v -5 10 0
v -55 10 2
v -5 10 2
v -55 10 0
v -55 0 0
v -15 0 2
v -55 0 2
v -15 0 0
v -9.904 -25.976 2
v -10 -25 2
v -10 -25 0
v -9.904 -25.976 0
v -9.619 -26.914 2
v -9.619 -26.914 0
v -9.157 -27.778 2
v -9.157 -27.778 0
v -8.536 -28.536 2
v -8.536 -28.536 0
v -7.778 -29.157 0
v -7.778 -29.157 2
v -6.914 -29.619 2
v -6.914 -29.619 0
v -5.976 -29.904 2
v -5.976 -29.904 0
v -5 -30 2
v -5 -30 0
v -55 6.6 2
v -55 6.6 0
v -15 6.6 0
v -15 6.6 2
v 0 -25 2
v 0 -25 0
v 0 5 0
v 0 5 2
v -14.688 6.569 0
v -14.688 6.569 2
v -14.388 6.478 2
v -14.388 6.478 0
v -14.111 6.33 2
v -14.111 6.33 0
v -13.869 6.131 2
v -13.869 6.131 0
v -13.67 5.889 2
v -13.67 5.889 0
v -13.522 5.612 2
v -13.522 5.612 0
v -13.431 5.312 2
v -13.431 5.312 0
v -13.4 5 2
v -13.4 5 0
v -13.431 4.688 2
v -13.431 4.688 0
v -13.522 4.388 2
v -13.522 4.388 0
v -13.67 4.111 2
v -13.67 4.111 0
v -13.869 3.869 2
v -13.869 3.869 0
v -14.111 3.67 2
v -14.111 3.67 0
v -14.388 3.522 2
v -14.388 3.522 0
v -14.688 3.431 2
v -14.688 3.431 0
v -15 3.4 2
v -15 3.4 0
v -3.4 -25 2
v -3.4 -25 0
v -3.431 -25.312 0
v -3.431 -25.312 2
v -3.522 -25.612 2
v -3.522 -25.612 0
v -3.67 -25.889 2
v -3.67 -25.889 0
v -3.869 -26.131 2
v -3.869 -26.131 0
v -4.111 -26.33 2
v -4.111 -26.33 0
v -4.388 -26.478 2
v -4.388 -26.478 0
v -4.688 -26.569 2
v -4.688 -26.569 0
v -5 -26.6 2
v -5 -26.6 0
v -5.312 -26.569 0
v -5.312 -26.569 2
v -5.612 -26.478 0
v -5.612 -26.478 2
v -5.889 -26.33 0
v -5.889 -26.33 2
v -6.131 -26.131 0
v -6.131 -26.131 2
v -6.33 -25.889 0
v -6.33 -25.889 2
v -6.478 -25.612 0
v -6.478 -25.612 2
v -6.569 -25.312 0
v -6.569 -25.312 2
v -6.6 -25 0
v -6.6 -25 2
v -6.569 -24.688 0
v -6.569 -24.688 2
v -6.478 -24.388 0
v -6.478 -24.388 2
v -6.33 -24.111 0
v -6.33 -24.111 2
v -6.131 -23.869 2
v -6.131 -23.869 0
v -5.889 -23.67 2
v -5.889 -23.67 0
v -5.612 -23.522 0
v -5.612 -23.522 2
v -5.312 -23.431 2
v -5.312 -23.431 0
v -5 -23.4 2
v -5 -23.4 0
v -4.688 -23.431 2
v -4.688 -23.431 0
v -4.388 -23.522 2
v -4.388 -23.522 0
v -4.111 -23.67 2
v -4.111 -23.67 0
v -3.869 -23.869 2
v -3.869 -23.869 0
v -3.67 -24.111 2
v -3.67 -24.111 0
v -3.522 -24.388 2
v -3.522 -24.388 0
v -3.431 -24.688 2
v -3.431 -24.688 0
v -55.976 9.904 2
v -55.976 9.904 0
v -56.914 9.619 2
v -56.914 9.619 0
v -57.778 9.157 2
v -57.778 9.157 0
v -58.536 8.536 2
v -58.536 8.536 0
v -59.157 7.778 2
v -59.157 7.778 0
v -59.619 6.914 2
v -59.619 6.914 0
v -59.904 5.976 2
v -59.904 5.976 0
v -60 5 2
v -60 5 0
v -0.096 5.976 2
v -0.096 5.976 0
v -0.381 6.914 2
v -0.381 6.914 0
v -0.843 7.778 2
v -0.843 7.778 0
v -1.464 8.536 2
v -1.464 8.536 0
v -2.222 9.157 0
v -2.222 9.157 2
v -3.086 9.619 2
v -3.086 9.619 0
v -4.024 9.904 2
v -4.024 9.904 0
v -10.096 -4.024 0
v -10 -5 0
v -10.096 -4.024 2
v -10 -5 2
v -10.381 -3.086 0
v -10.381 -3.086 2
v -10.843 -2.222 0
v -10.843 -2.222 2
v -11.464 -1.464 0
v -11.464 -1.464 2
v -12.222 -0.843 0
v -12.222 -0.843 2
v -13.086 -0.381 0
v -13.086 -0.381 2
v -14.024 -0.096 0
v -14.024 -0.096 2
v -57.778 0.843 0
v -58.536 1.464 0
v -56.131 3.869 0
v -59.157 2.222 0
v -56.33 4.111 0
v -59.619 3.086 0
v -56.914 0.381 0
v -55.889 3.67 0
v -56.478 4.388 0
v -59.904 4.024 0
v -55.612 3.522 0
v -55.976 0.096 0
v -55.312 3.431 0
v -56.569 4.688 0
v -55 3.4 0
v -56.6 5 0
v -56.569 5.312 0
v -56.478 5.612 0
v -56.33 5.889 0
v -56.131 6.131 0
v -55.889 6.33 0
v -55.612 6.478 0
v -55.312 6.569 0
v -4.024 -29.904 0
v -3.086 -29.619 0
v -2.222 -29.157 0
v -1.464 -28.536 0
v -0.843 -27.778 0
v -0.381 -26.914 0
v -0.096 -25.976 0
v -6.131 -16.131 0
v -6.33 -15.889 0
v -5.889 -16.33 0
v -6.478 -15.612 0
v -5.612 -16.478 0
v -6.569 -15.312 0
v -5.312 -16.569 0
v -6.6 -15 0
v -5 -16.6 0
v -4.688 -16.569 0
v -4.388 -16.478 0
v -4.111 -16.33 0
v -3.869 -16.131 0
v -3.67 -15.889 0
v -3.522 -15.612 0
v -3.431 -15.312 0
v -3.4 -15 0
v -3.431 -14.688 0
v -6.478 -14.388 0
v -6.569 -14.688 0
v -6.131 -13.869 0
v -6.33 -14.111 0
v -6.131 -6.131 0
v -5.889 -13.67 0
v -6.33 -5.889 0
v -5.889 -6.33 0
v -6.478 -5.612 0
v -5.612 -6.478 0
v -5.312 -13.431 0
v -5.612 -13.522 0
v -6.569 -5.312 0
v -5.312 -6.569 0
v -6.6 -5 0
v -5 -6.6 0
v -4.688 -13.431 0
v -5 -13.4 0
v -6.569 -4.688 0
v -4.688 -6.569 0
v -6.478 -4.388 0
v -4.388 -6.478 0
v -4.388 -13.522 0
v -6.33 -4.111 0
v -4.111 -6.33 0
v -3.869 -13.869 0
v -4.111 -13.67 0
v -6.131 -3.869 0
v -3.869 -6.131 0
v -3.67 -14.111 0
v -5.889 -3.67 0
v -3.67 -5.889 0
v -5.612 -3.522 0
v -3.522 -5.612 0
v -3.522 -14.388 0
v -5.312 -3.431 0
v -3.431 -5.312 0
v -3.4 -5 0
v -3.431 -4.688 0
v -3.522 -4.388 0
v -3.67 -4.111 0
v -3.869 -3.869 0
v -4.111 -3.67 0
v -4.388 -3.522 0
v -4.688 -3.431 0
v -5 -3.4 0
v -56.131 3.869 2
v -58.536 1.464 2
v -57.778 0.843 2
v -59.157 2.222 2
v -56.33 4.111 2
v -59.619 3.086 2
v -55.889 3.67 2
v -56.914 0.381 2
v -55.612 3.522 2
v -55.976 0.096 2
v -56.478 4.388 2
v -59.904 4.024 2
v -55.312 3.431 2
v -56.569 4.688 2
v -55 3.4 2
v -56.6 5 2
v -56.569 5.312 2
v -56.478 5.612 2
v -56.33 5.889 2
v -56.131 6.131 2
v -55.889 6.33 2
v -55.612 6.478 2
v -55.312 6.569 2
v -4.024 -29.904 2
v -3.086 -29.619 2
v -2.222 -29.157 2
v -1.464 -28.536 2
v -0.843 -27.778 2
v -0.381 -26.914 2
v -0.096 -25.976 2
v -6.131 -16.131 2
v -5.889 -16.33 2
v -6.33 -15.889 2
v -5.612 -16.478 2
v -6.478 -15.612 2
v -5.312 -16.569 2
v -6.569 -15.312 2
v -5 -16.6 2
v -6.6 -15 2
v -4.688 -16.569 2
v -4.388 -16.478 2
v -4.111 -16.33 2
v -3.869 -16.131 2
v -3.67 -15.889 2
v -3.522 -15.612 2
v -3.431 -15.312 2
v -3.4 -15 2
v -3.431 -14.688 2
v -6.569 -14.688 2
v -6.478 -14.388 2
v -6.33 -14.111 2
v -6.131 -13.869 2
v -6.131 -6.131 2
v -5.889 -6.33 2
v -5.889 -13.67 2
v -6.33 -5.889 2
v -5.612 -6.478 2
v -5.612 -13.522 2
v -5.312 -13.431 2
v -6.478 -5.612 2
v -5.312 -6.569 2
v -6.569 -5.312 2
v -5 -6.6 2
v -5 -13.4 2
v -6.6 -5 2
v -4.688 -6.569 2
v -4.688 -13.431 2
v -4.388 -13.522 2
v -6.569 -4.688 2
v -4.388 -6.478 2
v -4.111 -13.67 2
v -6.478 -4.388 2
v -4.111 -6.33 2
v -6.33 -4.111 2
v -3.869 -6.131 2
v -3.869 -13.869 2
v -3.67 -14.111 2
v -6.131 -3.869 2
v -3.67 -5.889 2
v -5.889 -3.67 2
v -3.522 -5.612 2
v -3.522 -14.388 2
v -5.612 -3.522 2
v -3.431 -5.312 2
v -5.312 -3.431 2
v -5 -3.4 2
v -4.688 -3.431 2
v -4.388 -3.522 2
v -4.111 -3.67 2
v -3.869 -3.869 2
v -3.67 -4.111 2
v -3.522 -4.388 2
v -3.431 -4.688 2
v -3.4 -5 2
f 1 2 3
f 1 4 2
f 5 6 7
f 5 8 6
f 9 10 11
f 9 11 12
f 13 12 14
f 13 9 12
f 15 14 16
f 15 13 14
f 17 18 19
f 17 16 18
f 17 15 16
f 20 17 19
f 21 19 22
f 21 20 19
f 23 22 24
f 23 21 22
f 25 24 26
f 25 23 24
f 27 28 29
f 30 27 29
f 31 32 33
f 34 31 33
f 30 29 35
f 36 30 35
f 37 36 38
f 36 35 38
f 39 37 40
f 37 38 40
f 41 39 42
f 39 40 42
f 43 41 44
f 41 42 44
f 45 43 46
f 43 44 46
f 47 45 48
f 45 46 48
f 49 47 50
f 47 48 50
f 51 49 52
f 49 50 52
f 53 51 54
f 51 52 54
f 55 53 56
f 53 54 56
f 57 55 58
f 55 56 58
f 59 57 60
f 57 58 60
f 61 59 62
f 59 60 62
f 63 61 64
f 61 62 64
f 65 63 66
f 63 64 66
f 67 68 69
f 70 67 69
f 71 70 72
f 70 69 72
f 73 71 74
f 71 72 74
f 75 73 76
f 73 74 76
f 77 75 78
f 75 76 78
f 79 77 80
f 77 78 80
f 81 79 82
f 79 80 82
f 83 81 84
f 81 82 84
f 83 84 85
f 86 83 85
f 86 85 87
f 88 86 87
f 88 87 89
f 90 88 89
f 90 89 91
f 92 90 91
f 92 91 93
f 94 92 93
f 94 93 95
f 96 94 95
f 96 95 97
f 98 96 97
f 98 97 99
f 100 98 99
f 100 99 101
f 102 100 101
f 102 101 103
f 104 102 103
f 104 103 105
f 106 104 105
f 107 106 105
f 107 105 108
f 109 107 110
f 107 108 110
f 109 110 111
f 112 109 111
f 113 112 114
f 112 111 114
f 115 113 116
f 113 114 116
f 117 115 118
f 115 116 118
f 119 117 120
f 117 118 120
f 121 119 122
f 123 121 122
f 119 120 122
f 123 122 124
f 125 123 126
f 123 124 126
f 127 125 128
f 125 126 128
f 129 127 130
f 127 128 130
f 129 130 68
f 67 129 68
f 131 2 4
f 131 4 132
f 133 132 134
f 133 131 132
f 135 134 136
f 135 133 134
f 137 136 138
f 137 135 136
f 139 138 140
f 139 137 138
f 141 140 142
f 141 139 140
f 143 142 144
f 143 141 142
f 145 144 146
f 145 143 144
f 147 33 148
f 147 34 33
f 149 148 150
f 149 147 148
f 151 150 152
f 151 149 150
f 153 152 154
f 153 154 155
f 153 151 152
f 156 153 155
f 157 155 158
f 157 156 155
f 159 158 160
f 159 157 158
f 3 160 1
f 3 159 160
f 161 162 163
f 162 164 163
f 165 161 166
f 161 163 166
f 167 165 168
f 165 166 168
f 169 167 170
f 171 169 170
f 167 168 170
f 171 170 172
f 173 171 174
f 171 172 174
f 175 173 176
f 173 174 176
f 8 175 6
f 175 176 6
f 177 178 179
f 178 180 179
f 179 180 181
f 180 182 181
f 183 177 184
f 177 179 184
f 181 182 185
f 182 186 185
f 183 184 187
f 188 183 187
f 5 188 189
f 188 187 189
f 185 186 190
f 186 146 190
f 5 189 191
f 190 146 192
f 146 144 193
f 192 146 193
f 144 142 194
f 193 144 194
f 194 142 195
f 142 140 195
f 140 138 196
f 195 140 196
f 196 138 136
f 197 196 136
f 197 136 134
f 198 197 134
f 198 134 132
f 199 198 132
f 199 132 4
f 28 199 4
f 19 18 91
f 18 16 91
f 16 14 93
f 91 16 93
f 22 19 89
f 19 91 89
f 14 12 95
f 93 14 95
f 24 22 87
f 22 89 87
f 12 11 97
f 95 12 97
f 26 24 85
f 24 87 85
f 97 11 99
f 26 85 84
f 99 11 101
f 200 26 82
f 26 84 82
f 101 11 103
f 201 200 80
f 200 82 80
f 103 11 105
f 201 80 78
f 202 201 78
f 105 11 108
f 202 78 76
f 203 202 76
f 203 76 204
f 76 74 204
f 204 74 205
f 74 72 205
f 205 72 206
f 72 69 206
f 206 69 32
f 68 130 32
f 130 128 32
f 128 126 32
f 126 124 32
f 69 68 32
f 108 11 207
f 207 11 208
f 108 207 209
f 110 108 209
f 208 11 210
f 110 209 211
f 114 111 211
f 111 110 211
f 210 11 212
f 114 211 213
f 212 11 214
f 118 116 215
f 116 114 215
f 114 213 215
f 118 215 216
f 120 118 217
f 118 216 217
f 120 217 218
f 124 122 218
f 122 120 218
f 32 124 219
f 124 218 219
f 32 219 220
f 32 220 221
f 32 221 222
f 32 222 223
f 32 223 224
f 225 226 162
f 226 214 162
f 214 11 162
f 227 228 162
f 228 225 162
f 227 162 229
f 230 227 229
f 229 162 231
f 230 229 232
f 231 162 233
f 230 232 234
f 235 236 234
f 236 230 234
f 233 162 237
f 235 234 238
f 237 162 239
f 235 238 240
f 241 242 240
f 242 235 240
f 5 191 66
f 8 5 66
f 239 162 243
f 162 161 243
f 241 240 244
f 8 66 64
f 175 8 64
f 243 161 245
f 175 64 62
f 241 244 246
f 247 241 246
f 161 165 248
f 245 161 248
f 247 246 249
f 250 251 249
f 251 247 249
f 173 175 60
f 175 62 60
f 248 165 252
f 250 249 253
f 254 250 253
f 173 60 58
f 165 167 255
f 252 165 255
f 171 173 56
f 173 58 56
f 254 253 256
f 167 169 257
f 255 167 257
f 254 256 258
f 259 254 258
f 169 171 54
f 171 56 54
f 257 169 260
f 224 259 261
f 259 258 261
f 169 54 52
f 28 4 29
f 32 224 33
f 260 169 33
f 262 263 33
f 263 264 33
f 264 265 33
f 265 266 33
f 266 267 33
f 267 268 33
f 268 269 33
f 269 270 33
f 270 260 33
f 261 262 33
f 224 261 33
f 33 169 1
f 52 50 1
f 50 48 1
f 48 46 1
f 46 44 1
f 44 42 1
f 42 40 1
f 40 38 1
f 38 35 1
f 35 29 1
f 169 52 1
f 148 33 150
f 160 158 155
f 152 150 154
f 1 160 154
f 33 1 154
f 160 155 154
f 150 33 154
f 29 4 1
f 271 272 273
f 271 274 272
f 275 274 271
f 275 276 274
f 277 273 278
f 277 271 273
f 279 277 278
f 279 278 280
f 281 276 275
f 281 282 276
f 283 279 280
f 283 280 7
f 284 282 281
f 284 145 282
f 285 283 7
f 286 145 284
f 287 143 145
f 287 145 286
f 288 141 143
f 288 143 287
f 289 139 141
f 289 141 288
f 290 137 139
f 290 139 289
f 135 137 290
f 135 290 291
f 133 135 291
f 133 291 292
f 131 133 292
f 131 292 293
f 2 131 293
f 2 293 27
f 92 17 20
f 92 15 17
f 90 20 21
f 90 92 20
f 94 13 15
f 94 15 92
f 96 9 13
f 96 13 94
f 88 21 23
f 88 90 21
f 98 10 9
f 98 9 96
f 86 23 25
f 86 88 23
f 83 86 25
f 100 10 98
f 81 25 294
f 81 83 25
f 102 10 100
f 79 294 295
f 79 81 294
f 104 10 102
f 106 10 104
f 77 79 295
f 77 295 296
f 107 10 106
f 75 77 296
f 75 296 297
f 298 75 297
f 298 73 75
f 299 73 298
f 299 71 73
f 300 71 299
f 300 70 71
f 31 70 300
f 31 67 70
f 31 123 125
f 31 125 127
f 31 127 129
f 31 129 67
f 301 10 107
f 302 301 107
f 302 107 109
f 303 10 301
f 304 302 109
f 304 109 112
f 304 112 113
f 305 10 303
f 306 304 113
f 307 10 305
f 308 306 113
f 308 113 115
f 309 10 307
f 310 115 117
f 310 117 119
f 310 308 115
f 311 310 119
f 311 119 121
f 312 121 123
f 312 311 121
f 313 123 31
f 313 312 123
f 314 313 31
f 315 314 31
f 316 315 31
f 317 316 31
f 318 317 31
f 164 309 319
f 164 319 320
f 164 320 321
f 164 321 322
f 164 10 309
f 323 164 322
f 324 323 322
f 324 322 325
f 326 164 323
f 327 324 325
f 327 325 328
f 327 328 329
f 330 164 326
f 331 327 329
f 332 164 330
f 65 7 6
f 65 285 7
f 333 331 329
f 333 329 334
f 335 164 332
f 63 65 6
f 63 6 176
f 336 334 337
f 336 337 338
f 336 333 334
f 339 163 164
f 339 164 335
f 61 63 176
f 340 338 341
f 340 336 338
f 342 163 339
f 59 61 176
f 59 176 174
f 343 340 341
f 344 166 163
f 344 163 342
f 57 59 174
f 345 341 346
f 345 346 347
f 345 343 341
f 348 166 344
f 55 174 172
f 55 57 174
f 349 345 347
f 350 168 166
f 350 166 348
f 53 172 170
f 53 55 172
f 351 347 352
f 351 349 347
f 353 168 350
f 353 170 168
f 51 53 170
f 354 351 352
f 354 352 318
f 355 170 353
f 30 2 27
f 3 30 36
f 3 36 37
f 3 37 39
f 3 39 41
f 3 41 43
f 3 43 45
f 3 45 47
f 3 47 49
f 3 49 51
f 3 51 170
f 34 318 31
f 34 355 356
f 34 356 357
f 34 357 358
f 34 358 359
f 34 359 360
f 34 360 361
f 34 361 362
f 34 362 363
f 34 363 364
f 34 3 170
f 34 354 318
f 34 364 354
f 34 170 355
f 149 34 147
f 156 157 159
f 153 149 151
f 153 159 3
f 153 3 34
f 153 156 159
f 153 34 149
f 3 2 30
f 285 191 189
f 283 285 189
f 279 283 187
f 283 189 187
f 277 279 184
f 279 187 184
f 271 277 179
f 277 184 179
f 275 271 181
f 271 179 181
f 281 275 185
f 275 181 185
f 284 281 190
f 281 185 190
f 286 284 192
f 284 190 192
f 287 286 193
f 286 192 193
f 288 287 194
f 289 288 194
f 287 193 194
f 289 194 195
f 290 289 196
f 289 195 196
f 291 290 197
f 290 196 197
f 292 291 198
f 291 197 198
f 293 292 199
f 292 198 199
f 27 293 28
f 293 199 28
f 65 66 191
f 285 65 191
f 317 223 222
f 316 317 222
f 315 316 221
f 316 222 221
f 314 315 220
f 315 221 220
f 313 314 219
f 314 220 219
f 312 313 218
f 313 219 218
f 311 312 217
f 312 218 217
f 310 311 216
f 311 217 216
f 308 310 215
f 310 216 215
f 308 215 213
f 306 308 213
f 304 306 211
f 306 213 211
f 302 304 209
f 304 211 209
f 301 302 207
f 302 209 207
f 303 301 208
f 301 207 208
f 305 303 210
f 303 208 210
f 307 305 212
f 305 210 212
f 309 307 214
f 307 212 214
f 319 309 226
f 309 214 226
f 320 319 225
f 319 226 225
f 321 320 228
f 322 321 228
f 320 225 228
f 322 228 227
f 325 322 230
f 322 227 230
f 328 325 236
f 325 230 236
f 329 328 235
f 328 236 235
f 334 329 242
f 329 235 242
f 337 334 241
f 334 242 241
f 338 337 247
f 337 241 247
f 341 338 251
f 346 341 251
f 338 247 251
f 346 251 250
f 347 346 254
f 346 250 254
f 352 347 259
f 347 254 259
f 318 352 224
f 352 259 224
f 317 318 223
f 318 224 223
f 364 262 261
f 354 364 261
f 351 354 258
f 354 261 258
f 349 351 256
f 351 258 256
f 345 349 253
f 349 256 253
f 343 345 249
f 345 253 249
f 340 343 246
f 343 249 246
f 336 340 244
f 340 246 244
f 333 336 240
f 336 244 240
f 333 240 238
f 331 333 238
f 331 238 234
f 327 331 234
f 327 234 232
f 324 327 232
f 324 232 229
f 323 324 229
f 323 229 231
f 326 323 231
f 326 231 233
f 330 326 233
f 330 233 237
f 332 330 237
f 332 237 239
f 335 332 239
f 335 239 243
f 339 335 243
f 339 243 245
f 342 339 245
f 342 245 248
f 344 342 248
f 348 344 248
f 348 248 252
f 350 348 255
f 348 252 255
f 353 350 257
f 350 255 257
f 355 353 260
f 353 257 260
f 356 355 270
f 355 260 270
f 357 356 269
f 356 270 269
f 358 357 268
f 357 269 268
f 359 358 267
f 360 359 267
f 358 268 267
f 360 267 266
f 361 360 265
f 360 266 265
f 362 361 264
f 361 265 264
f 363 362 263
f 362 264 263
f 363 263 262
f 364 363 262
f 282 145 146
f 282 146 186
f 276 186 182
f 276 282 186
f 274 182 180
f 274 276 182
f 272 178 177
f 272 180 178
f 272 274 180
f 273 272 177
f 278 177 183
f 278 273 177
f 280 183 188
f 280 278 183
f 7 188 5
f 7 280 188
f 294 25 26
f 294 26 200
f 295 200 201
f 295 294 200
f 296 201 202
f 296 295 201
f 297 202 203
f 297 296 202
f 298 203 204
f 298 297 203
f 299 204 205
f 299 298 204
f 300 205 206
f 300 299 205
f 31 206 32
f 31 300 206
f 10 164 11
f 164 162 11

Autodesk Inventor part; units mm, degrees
ref_plane "YZ Plane" through (0, 0, 0) normal (1, 0, 0) x (0, 1, 0)
ref_plane "XZ Plane" through (0, 0, 0) normal (0, 1, 0) x (-1, 0, 0)
ref_plane "XY Plane" through (0, 0, 0) normal (0, 0, 1) x (1, 0, 0)
sketch "スケッチ1" plane through (0, 0, 0) normal (0, 0, 1) x (1, 0, 0)
  line L0 (0, 0) -> (-10, 0)
  line L1 (-10, 0) -> (-10, -30)
  line L2 (-10, -30) -> (0, -30)
  line L3 (0, -30) -> (0, 0)
  line L4 (0, 0) -> (-60, 0)
  line L5 (-60, 0) -> (-60, 10)
  line L6 (-60, 10) -> (0, 10)
  line L7 (0, 10) -> (0, 0)
  line L8 (-5, -30) -> (-5, 0)
  line L9 (0, 5) -> (-60, 5)
  circle A0 centre (-5, 5) radius 1.6
  circle A1 centre (-5, -5) radius 1.6
  circle A2 centre (-15, 5) radius 1.6
  circle A3 centre (-25, 5) radius 1.6
  circle A4 centre (-5, -15) radius 1.6
  circle A5 centre (-35, 5) radius 1.6
  circle A6 centre (-45, 5) radius 1.6
  circle A7 centre (-55, 5) radius 1.6
  line L10 (-5, 3.4) -> (-55, 3.4)
  line L11 (-55, 6.6) -> (-5, 6.6)
  circle A8 centre (-5, -25) radius 1.6
  point P0 (-45, 3.4)
  point P1 (-45, 6.6)
  point P2 (-15, 3.4)
  point P3 (-15, 6.6)
  dimension "d0" = 10
  dimension "d1" = 30
  dimension "d2" = 60
  dimension "d3" = 10
  dimension "d4" = 3.2
  dimension "d5" = 3.2
  dimension "d6" = 5
  dimension "d7" = 5
  dimension "d8" = 10
  dimension "d11" = 10
  dimension "d18" = 10
extrude "押し出し1" add sketch "スケッチ1" along normal blind 2 contours L3 L2 L8 A8 A4 A1 L0 | L0 L4 L5 L9 A7 L10 A0 L7 | L8 A1 A4 A8 L2 L1 L0 | L9 A0 L11 A7 L5 L6 L7 | A0 L9 | L9 A0 | A0 L10 A2 L9 | L9 A2 L11 A0
fillet "フィレット1" radius 5 6 edges at (0, 10, 1) (-60, 10, 1) (-60, 0, 1) (0, -30, 1) (-10, -30, 1) (-10, 0, 1)
properties part number "kakutome_nc_slit"
